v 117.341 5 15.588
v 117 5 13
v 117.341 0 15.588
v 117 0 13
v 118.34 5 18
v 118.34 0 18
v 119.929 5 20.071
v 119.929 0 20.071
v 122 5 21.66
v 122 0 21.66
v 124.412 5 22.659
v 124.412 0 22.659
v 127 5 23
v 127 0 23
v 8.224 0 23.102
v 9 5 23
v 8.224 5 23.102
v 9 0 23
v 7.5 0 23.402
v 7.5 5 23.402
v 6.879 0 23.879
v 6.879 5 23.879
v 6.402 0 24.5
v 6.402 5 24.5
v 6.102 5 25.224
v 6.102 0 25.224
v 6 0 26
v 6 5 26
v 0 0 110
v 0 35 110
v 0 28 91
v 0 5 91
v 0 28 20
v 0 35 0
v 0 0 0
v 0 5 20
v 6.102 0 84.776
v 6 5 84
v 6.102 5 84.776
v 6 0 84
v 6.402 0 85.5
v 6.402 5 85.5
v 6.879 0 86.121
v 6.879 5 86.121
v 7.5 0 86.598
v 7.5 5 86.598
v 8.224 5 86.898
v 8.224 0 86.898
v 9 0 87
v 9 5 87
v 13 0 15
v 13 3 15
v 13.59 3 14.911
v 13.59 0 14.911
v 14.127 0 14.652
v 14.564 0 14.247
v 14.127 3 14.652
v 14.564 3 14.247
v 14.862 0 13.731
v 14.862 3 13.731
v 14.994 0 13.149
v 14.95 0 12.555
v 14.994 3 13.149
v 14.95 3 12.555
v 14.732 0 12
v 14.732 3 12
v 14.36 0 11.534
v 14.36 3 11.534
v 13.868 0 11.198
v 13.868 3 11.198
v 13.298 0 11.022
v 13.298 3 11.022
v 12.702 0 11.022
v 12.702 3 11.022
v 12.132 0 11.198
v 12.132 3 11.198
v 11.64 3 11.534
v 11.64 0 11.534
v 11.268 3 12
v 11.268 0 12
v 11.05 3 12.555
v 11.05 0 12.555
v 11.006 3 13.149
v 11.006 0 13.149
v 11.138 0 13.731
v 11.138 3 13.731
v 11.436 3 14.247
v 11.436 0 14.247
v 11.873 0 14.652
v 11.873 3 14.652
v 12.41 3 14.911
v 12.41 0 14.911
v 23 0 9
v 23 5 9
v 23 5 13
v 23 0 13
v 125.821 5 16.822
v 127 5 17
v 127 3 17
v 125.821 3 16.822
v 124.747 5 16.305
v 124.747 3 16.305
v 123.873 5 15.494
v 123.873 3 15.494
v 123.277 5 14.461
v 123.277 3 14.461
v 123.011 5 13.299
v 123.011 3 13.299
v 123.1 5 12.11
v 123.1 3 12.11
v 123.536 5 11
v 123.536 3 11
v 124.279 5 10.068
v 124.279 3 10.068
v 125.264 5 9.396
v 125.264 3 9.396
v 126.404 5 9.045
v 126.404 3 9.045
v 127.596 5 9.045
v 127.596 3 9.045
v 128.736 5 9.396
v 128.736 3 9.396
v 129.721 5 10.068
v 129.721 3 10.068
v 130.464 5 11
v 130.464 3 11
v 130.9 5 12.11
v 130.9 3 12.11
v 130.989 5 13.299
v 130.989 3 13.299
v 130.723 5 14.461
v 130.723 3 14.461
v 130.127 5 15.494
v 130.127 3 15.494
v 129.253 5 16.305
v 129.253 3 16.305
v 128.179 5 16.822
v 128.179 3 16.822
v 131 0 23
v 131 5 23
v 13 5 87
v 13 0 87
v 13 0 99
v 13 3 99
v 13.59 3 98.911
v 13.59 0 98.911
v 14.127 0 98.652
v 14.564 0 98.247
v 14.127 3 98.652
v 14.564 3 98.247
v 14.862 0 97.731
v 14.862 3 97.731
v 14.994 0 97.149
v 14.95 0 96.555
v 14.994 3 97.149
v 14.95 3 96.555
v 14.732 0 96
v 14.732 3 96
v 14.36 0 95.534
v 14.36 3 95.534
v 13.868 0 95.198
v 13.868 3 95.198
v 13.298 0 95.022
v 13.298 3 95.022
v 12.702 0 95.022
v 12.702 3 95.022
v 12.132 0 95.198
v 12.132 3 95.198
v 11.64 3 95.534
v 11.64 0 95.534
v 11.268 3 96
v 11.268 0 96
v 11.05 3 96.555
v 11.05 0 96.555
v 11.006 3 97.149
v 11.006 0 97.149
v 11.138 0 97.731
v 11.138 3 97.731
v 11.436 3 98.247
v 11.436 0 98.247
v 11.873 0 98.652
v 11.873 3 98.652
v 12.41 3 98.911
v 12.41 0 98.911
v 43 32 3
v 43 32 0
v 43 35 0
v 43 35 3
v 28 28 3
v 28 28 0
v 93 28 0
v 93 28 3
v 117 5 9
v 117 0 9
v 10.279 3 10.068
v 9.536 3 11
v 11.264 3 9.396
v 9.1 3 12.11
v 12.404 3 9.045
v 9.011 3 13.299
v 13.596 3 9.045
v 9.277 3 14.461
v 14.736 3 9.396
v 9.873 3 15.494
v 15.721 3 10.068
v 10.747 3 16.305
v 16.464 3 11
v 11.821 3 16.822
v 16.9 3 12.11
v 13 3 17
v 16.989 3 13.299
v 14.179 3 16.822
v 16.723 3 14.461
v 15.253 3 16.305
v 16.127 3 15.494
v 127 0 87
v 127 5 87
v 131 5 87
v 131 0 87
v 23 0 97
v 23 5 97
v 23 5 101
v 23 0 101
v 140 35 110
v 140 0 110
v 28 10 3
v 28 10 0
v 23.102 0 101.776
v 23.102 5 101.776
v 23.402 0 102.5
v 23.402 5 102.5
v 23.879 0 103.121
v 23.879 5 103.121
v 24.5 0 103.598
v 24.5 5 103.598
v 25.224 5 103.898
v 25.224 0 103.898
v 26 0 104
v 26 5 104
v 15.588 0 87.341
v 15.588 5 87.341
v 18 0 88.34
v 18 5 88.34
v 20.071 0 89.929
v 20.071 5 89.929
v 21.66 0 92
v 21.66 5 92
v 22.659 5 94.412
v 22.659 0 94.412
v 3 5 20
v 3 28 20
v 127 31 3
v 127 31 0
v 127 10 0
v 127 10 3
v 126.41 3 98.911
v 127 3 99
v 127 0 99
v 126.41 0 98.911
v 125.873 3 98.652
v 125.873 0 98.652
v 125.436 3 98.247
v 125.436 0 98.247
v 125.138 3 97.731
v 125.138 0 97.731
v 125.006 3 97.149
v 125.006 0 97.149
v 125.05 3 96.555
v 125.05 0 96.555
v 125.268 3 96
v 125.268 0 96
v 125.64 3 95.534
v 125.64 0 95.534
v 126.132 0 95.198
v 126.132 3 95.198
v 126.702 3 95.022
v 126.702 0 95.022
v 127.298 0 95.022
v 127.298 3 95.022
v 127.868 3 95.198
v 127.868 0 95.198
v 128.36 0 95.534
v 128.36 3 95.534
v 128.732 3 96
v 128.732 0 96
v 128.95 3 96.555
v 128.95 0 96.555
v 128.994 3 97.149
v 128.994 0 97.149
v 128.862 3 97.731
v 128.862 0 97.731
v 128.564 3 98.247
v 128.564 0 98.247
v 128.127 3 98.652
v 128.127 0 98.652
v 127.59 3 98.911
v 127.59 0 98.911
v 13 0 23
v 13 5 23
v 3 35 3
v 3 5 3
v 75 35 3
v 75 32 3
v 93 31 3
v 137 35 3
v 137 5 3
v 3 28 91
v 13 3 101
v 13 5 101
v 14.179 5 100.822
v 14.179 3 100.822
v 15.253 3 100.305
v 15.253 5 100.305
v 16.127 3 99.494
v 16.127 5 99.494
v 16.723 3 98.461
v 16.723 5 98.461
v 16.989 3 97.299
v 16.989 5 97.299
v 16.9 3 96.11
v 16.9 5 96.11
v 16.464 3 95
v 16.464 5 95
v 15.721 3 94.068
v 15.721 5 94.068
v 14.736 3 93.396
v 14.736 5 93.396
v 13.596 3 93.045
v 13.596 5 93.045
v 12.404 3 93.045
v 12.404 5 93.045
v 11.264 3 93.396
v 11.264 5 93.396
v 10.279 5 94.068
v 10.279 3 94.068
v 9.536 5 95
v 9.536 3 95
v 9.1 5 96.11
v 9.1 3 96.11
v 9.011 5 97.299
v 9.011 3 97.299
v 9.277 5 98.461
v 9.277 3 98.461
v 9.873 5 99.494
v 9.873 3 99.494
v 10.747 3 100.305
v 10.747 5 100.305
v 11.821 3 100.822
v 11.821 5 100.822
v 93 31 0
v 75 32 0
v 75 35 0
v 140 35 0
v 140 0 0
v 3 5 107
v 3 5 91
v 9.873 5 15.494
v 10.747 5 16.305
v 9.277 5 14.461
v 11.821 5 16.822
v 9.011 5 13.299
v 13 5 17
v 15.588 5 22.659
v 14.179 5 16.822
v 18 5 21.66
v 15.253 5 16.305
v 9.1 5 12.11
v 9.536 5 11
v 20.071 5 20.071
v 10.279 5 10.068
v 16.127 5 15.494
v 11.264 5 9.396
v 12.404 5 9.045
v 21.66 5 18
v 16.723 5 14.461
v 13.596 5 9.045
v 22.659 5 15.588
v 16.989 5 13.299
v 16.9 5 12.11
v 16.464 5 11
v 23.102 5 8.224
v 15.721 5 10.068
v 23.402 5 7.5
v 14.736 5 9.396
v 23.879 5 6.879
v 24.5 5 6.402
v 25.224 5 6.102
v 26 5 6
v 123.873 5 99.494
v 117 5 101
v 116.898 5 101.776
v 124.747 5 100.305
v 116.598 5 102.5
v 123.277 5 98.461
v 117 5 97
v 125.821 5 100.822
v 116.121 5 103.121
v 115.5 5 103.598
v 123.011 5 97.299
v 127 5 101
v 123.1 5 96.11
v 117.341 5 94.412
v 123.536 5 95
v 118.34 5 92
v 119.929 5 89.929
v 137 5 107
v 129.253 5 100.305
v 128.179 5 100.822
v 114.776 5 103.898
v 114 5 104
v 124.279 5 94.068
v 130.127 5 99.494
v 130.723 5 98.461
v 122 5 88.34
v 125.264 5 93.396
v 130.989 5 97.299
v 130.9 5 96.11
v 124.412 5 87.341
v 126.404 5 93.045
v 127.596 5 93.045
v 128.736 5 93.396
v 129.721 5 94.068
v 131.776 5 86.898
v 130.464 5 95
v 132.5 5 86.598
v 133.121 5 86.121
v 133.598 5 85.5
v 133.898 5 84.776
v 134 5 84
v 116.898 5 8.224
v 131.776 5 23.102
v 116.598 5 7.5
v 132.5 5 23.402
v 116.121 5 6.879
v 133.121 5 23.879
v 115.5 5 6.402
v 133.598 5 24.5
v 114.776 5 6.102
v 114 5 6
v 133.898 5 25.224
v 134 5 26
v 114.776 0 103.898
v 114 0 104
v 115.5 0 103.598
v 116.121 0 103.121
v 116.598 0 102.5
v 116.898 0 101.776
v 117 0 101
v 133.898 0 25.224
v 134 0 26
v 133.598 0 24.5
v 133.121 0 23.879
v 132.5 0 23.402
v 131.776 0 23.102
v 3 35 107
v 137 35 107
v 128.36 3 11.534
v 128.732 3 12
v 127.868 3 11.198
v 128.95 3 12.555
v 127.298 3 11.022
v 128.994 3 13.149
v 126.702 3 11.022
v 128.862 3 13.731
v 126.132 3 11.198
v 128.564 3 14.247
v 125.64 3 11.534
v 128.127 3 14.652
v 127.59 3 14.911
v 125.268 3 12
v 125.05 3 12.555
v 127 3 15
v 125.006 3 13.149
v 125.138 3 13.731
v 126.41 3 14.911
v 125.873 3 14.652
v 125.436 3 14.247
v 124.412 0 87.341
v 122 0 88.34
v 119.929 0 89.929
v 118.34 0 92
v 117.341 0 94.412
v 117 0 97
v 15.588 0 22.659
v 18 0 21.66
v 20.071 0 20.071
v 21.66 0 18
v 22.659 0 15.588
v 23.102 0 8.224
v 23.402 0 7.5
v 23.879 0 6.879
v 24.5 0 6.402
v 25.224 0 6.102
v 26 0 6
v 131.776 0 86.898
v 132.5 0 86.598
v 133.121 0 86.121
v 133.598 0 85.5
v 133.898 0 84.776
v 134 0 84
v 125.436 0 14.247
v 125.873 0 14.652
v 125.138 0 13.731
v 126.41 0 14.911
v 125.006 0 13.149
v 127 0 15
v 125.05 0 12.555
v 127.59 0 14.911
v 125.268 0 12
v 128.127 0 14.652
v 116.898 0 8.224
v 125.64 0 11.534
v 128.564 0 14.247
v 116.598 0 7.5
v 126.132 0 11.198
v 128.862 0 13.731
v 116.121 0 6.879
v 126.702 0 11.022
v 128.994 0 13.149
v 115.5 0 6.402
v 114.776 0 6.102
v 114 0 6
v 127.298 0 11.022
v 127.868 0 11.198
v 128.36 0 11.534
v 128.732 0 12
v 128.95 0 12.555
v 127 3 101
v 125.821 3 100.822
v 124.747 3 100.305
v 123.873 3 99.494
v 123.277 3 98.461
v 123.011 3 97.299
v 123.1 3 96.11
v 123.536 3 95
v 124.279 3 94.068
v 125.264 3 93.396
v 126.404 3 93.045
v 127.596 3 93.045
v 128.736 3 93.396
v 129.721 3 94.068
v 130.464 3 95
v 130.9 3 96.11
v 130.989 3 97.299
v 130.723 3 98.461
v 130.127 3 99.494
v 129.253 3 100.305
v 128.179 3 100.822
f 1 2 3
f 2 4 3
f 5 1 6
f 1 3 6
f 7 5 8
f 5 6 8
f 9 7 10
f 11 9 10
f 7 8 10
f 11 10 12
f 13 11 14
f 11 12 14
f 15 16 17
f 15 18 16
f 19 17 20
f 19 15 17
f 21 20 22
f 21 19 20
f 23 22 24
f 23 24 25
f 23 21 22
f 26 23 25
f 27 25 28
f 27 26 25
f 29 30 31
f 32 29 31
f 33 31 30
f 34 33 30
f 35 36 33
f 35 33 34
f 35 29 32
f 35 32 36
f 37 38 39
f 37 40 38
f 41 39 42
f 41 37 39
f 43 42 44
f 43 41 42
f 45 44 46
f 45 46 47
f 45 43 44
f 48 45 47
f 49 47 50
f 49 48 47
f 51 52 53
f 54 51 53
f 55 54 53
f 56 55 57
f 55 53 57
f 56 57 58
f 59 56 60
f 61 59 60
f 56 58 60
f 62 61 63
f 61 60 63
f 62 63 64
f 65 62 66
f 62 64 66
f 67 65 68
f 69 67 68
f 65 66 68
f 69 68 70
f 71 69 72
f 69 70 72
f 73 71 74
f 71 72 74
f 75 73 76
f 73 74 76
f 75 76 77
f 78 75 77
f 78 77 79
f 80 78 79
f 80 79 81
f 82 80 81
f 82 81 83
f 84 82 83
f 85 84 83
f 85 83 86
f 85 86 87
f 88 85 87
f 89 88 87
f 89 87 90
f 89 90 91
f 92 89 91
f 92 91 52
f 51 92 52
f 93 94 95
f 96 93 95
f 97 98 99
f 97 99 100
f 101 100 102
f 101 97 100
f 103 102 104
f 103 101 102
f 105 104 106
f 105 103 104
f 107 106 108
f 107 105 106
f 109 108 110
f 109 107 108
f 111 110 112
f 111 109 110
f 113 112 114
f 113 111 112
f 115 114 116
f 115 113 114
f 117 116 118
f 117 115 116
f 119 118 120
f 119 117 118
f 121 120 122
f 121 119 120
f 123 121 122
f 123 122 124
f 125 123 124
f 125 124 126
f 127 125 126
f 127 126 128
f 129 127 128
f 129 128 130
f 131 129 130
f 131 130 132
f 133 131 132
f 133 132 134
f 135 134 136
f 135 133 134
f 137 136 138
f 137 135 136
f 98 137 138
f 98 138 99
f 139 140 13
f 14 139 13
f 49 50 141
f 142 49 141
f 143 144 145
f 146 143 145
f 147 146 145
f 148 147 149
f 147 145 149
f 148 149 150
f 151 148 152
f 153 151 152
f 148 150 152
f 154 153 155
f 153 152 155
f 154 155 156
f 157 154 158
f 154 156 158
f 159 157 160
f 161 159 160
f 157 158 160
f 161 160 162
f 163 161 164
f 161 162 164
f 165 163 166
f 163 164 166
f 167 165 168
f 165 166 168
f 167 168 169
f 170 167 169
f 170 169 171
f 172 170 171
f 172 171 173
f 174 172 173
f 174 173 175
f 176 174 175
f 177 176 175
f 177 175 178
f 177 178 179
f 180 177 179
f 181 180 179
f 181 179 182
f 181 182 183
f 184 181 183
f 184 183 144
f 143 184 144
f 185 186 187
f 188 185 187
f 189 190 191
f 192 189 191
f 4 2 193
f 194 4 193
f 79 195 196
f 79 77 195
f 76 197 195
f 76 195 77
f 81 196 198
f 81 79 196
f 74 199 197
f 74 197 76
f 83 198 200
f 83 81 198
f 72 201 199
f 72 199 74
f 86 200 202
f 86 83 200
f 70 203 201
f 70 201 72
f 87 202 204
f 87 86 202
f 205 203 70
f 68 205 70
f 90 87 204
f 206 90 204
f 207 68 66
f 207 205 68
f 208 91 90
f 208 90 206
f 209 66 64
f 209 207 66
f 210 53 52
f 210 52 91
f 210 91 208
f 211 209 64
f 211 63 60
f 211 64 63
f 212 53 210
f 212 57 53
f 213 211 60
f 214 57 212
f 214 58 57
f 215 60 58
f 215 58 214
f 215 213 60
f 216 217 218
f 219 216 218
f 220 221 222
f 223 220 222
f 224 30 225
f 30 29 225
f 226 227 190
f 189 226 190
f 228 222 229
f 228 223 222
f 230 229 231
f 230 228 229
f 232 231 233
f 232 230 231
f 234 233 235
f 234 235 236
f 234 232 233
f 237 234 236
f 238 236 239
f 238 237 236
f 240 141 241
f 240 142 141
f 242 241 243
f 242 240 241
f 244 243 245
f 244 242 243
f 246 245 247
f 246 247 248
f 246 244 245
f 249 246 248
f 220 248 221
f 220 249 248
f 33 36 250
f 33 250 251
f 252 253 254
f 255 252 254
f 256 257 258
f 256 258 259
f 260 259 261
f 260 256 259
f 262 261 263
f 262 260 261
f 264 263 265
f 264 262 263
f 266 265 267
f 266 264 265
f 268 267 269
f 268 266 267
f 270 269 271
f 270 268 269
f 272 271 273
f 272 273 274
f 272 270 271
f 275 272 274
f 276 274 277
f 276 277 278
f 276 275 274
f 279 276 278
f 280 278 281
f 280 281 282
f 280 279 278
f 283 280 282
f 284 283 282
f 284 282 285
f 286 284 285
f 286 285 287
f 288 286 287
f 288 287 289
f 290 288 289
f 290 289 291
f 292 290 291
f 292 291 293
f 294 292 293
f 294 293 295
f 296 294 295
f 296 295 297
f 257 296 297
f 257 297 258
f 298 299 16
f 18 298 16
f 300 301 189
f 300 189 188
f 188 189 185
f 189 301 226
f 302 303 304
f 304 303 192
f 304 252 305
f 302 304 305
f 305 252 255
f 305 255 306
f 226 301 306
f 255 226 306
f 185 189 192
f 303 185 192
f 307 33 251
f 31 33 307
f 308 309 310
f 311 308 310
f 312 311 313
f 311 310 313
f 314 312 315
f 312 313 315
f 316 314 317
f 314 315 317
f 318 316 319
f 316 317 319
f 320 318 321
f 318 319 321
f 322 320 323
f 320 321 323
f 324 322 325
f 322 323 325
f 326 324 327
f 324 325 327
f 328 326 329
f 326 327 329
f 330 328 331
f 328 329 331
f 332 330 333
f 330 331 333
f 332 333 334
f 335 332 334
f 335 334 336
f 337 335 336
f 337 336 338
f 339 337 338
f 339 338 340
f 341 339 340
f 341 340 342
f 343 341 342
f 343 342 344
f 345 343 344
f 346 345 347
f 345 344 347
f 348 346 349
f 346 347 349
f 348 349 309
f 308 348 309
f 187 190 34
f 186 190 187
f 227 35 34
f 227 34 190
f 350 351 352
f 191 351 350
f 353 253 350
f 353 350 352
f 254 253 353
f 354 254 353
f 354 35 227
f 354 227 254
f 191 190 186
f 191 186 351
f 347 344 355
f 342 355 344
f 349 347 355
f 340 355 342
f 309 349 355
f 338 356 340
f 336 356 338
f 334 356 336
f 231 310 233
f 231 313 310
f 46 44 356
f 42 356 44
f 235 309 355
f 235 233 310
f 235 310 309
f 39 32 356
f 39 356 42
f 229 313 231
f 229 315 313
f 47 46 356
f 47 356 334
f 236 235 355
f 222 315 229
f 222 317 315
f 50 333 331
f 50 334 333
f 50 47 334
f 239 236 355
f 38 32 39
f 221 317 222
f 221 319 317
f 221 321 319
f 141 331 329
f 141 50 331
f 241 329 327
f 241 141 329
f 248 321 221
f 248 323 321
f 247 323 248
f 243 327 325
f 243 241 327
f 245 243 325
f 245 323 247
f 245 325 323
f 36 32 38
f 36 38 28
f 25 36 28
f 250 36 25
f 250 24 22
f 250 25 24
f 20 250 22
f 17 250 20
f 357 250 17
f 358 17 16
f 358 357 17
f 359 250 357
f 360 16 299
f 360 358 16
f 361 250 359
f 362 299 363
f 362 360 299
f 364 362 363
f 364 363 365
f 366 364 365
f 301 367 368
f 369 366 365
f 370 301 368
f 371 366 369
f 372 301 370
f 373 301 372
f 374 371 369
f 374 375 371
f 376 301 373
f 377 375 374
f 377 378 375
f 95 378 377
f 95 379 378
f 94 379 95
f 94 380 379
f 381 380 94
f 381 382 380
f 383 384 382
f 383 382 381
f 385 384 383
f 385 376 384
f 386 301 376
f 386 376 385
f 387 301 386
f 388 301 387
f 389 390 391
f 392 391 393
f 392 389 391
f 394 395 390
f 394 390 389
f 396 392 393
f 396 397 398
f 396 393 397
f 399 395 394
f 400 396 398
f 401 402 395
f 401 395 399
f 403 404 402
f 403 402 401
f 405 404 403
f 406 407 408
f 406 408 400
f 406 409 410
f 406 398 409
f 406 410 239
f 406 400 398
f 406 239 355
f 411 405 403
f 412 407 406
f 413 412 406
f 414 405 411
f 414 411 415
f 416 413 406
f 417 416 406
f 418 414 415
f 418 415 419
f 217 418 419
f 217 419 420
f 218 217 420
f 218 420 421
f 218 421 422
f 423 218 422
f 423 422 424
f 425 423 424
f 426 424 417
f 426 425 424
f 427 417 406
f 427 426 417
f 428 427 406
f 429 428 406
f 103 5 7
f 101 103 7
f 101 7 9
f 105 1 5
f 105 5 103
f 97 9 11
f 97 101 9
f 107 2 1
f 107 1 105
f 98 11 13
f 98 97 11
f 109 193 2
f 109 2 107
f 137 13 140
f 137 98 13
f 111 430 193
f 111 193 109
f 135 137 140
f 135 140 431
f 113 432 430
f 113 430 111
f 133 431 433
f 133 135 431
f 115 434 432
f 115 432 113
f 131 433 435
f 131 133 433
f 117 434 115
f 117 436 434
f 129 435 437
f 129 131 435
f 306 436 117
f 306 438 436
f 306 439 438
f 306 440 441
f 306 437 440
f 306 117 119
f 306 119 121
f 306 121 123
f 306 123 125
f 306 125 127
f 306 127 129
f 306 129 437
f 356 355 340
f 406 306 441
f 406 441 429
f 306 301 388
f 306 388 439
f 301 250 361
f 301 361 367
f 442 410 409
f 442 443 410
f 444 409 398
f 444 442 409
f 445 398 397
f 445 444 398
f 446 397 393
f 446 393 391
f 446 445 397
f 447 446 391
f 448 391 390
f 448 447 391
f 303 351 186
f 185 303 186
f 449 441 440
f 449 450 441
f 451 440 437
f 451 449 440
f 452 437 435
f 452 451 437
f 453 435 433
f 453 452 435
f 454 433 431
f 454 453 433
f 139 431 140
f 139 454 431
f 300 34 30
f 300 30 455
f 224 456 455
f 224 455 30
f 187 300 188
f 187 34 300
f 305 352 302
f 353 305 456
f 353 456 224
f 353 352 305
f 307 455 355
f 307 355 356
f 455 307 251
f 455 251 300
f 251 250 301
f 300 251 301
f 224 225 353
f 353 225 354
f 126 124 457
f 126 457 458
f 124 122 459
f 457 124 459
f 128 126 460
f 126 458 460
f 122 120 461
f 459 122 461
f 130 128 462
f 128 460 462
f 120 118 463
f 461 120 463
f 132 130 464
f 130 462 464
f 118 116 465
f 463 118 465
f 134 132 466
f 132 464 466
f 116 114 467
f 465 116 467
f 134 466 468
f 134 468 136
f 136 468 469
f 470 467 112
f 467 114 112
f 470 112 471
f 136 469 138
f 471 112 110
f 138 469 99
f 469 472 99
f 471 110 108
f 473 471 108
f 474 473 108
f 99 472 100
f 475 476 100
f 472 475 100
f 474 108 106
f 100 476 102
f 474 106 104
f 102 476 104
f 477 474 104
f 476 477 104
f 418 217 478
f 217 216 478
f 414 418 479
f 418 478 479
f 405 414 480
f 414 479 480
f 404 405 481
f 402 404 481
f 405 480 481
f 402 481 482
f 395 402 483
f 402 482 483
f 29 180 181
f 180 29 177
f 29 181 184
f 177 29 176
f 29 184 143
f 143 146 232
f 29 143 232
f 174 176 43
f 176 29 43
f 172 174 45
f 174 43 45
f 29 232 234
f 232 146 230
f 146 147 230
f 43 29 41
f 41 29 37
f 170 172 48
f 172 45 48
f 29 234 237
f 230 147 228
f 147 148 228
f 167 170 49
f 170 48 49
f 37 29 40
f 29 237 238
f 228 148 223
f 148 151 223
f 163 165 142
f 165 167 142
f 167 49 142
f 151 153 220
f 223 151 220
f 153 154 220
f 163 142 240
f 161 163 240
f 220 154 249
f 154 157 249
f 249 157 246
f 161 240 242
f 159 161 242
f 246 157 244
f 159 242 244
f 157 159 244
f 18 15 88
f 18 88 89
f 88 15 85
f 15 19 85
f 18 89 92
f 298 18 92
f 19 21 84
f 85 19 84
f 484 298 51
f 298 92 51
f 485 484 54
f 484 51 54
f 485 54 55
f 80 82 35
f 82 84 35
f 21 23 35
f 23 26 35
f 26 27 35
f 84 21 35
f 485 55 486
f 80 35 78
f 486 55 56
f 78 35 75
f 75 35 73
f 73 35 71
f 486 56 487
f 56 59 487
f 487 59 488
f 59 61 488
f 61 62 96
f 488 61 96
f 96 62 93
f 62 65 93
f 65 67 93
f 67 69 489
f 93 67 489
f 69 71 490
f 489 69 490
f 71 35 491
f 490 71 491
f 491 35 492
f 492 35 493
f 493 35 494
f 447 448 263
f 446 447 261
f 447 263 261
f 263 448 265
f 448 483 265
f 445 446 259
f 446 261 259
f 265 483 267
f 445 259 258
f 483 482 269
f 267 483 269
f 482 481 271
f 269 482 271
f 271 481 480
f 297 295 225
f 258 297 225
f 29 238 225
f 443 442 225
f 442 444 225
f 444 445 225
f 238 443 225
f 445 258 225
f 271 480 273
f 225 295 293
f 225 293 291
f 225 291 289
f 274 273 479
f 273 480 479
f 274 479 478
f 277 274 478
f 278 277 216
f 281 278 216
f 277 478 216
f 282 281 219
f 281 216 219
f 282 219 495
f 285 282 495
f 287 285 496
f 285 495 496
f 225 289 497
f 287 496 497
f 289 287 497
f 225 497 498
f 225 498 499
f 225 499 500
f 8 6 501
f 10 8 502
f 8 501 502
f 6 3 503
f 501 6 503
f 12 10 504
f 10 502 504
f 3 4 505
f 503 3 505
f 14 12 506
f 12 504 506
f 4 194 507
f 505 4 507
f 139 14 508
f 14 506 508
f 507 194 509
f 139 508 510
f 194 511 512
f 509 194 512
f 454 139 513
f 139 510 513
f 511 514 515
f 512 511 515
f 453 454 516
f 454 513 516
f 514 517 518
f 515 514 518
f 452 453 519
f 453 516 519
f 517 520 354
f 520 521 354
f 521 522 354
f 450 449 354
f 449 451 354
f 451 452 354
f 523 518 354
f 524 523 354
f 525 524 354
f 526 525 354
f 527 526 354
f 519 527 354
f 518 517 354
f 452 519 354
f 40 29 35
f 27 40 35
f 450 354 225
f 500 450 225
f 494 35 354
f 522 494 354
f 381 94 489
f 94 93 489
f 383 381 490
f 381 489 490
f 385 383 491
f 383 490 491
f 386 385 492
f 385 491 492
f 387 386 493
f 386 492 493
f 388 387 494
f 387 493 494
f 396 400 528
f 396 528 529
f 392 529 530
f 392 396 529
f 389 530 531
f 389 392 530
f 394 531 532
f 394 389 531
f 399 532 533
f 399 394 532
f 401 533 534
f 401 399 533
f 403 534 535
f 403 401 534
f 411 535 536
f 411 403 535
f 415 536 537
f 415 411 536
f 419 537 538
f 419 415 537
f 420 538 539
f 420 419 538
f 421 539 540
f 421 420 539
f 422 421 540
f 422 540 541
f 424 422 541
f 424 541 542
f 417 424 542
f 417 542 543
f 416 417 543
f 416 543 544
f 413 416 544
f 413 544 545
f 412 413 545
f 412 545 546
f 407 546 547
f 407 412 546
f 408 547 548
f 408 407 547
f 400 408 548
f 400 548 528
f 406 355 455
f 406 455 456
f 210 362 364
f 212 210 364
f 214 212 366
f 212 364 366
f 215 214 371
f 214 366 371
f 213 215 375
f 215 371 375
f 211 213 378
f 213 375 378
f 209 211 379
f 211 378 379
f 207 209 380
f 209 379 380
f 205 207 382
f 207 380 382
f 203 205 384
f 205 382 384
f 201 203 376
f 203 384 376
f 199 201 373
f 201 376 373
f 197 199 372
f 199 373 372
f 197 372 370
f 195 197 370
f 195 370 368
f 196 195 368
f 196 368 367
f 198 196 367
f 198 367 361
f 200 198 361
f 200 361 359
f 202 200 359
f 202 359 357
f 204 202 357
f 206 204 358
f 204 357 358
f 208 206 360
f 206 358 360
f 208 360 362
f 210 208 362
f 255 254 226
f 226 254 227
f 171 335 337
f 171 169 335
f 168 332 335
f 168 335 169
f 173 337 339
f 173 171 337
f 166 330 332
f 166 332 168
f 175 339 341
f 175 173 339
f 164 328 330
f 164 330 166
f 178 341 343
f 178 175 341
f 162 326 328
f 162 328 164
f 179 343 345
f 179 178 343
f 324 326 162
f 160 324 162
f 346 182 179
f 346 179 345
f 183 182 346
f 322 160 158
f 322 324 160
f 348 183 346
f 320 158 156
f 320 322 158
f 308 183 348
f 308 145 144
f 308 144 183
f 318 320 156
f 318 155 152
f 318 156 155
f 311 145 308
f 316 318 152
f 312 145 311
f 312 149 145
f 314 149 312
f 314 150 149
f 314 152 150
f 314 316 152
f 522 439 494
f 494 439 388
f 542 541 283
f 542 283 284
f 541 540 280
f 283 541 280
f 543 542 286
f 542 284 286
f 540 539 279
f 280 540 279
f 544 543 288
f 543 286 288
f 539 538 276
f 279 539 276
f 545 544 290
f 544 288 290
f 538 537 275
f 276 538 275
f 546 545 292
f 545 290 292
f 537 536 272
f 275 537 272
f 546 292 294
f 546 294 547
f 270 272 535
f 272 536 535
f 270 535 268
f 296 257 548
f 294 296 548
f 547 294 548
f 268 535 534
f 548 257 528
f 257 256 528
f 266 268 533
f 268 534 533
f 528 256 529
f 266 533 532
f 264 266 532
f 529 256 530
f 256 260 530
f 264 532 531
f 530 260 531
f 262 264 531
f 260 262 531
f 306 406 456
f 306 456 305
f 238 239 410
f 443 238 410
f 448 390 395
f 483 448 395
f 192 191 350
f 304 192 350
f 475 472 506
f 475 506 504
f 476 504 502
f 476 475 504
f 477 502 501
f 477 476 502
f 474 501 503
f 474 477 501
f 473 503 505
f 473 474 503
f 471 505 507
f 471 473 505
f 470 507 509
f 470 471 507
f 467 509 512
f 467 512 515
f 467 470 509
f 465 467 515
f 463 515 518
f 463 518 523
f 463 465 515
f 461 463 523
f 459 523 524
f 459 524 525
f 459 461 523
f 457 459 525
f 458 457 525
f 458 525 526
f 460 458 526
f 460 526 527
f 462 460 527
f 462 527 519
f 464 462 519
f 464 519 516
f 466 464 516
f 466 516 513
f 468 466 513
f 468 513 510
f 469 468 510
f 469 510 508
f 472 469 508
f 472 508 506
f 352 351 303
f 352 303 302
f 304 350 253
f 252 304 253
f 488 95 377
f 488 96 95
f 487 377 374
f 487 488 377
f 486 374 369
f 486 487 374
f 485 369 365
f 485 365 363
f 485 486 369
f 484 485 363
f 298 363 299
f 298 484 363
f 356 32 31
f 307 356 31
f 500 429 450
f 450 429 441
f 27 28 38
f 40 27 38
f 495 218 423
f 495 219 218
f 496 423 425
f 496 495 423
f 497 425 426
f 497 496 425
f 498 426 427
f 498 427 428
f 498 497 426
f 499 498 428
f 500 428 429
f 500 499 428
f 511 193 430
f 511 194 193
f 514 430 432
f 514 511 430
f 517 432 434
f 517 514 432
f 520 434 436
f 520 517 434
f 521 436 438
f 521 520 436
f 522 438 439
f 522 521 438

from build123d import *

# Parameters (mm, degrees)
SKETCH1_W           = 140
SKETCH1_H           = 110
BOSS_EXTRUDE1_DEPTH = 5
SKETCH3_W           = 140
SKETCH3_H           = 110
SKETCH3_W_2         = 134
SKETCH3_H_2         = 104
BOSS_EXTRUDE2_DEPTH = 30
CUT_EXTRUDE3_DEPTH  = 5
FILLET1_R           = 3
SKETCH5_R           = 4
CUT_EXTRUDE4_DEPTH  = 2
SKETCH6_R           = 2
CUT_EXTRUDE5_DEPTH  = 5
FILLET2_R           = 10
CUT_EXTRUDE6_DEPTH  = 3
SKETCH9_W           = 32
SKETCH9_H           = 3
CUT_EXTRUDE7_DEPTH  = 3
SKETCH10_W          = 71
SKETCH10_H          = 23
CUT_EXTRUDE8_DEPTH  = 3


with BuildPart() as part:
    # Sketch1 → Boss-Extrude1 (new body)
    with BuildSketch(Plane(origin=(0, 0, 0), x_dir=(1, 0, 0), z_dir=(0, 1, 0))):
        with Locations((70, -55)):
            Rectangle(SKETCH1_W, SKETCH1_H)
    extrude(amount=BOSS_EXTRUDE1_DEPTH)

    # Sketch3 → Boss-Extrude2 (add)
    with BuildSketch(Plane(origin=(0, 5, 0), x_dir=(1, 0, 0), z_dir=(0, 1, 0))):
        with Locations((70, -55)):
            Rectangle(SKETCH3_W, SKETCH3_H)
        with Locations((70, -55)):
            Rectangle(SKETCH3_W_2, SKETCH3_H_2, mode=Mode.SUBTRACT)
    extrude(amount=BOSS_EXTRUDE2_DEPTH)

    # Sketch4 → Cut-Extrude3 (cut)
    with BuildSketch(Plane(origin=(0, 5, 0), x_dir=(1, 0, 0), z_dir=(0, 1, 0))):
        Polygon((23, -6), (23, -23), (6, -23), (6, -87), (23, -87), (23, -104), (117, -104), (117, -87), (134, -87), (134, -23), (117, -23), (117, -6), align=None)
    extrude(amount=-CUT_EXTRUDE3_DEPTH, mode=Mode.SUBTRACT)

    # Fillet1
    fillet1_edges = [part.edges().sort_by_distance(p)[0] for p in [
        (23, 2.5, 6),
        (117, 2.5, 6),
        (134, 2.5, 23),
        (134, 2.5, 87),
        (117, 2.5, 104),
        (23, 2.5, 104),
        (6, 2.5, 87),
        (6, 2.5, 23),
    ]]
    fillet(fillet1_edges, radius=FILLET1_R)

    # Sketch5 → Cut-Extrude4 (cut)
    with BuildSketch(Plane(origin=(0, 5, 0), x_dir=(1, 0, 0), z_dir=(0, 1, 0))):
        with Locations(Location((13, -13, 0), (0, 0, 270))):
            Circle(SKETCH5_R)
        with Locations(Location((13, -97, 0), (0, 0, 270))):
            Circle(SKETCH5_R)
    cut_extrude4 = extrude(amount=-CUT_EXTRUDE4_DEPTH, mode=Mode.SUBTRACT)

    # Sketch6 → Cut-Extrude5 (cut)
    with BuildSketch(Plane(origin=(0, 5, 0), x_dir=(1, 0, 0), z_dir=(0, 1, 0))):
        with Locations(Location((13, -13, 0), (0, 0, 270))):
            Circle(SKETCH6_R)
        with Locations(Location((13, -97, 0), (0, 0, 270))):
            Circle(SKETCH6_R)
    cut_extrude5 = extrude(amount=-CUT_EXTRUDE5_DEPTH, mode=Mode.SUBTRACT)

    # Mirror1: Cut-Extrude4, Cut-Extrude5 across plane
    add(cut_extrude4.mirror(Plane(origin=(70, 0, 0), x_dir=(0, 0, 1), z_dir=(1, 0, 0))), mode=Mode.SUBTRACT)
    add(cut_extrude5.mirror(Plane(origin=(70, 0, 0), x_dir=(0, 0, 1), z_dir=(1, 0, 0))), mode=Mode.SUBTRACT)

    # Fillet2
    fillet2_edges = [part.edges().sort_by_distance(p)[0] for p in [
        (117, 2.5, 23),
        (117, 2.5, 87),
        (23, 2.5, 87),
        (23, 2.5, 23),
    ]]
    fillet(fillet2_edges, radius=FILLET2_R)

    # Sketch8 → Cut-Extrude6 (cut)
    with BuildSketch(Plane(origin=(0, 0, 0), x_dir=(-1, 0, 0), z_dir=(0, 0, -1))):
        Polygon((-127, 31), (-127, 10), (-28, 10), (-28, 28), (-93, 28), (-93, 31), align=None)
    extrude(amount=-CUT_EXTRUDE6_DEPTH, mode=Mode.SUBTRACT)

    # Sketch9 → Cut-Extrude7 (cut)
    with BuildSketch(Plane(origin=(0, 0, 0), x_dir=(-1, 0, 0), z_dir=(0, 0, -1))):
        with Locations((-59, 33.5)):
            Rectangle(SKETCH9_W, SKETCH9_H)
    extrude(amount=-CUT_EXTRUDE7_DEPTH, mode=Mode.SUBTRACT)

    # Sketch10 → Cut-Extrude8 (cut)
    with BuildSketch(Plane.ZY):
        with Locations((55.5, 16.5)):
            Rectangle(SKETCH10_W, SKETCH10_H)
    extrude(amount=-CUT_EXTRUDE8_DEPTH, mode=Mode.SUBTRACT)


solid = part.part
